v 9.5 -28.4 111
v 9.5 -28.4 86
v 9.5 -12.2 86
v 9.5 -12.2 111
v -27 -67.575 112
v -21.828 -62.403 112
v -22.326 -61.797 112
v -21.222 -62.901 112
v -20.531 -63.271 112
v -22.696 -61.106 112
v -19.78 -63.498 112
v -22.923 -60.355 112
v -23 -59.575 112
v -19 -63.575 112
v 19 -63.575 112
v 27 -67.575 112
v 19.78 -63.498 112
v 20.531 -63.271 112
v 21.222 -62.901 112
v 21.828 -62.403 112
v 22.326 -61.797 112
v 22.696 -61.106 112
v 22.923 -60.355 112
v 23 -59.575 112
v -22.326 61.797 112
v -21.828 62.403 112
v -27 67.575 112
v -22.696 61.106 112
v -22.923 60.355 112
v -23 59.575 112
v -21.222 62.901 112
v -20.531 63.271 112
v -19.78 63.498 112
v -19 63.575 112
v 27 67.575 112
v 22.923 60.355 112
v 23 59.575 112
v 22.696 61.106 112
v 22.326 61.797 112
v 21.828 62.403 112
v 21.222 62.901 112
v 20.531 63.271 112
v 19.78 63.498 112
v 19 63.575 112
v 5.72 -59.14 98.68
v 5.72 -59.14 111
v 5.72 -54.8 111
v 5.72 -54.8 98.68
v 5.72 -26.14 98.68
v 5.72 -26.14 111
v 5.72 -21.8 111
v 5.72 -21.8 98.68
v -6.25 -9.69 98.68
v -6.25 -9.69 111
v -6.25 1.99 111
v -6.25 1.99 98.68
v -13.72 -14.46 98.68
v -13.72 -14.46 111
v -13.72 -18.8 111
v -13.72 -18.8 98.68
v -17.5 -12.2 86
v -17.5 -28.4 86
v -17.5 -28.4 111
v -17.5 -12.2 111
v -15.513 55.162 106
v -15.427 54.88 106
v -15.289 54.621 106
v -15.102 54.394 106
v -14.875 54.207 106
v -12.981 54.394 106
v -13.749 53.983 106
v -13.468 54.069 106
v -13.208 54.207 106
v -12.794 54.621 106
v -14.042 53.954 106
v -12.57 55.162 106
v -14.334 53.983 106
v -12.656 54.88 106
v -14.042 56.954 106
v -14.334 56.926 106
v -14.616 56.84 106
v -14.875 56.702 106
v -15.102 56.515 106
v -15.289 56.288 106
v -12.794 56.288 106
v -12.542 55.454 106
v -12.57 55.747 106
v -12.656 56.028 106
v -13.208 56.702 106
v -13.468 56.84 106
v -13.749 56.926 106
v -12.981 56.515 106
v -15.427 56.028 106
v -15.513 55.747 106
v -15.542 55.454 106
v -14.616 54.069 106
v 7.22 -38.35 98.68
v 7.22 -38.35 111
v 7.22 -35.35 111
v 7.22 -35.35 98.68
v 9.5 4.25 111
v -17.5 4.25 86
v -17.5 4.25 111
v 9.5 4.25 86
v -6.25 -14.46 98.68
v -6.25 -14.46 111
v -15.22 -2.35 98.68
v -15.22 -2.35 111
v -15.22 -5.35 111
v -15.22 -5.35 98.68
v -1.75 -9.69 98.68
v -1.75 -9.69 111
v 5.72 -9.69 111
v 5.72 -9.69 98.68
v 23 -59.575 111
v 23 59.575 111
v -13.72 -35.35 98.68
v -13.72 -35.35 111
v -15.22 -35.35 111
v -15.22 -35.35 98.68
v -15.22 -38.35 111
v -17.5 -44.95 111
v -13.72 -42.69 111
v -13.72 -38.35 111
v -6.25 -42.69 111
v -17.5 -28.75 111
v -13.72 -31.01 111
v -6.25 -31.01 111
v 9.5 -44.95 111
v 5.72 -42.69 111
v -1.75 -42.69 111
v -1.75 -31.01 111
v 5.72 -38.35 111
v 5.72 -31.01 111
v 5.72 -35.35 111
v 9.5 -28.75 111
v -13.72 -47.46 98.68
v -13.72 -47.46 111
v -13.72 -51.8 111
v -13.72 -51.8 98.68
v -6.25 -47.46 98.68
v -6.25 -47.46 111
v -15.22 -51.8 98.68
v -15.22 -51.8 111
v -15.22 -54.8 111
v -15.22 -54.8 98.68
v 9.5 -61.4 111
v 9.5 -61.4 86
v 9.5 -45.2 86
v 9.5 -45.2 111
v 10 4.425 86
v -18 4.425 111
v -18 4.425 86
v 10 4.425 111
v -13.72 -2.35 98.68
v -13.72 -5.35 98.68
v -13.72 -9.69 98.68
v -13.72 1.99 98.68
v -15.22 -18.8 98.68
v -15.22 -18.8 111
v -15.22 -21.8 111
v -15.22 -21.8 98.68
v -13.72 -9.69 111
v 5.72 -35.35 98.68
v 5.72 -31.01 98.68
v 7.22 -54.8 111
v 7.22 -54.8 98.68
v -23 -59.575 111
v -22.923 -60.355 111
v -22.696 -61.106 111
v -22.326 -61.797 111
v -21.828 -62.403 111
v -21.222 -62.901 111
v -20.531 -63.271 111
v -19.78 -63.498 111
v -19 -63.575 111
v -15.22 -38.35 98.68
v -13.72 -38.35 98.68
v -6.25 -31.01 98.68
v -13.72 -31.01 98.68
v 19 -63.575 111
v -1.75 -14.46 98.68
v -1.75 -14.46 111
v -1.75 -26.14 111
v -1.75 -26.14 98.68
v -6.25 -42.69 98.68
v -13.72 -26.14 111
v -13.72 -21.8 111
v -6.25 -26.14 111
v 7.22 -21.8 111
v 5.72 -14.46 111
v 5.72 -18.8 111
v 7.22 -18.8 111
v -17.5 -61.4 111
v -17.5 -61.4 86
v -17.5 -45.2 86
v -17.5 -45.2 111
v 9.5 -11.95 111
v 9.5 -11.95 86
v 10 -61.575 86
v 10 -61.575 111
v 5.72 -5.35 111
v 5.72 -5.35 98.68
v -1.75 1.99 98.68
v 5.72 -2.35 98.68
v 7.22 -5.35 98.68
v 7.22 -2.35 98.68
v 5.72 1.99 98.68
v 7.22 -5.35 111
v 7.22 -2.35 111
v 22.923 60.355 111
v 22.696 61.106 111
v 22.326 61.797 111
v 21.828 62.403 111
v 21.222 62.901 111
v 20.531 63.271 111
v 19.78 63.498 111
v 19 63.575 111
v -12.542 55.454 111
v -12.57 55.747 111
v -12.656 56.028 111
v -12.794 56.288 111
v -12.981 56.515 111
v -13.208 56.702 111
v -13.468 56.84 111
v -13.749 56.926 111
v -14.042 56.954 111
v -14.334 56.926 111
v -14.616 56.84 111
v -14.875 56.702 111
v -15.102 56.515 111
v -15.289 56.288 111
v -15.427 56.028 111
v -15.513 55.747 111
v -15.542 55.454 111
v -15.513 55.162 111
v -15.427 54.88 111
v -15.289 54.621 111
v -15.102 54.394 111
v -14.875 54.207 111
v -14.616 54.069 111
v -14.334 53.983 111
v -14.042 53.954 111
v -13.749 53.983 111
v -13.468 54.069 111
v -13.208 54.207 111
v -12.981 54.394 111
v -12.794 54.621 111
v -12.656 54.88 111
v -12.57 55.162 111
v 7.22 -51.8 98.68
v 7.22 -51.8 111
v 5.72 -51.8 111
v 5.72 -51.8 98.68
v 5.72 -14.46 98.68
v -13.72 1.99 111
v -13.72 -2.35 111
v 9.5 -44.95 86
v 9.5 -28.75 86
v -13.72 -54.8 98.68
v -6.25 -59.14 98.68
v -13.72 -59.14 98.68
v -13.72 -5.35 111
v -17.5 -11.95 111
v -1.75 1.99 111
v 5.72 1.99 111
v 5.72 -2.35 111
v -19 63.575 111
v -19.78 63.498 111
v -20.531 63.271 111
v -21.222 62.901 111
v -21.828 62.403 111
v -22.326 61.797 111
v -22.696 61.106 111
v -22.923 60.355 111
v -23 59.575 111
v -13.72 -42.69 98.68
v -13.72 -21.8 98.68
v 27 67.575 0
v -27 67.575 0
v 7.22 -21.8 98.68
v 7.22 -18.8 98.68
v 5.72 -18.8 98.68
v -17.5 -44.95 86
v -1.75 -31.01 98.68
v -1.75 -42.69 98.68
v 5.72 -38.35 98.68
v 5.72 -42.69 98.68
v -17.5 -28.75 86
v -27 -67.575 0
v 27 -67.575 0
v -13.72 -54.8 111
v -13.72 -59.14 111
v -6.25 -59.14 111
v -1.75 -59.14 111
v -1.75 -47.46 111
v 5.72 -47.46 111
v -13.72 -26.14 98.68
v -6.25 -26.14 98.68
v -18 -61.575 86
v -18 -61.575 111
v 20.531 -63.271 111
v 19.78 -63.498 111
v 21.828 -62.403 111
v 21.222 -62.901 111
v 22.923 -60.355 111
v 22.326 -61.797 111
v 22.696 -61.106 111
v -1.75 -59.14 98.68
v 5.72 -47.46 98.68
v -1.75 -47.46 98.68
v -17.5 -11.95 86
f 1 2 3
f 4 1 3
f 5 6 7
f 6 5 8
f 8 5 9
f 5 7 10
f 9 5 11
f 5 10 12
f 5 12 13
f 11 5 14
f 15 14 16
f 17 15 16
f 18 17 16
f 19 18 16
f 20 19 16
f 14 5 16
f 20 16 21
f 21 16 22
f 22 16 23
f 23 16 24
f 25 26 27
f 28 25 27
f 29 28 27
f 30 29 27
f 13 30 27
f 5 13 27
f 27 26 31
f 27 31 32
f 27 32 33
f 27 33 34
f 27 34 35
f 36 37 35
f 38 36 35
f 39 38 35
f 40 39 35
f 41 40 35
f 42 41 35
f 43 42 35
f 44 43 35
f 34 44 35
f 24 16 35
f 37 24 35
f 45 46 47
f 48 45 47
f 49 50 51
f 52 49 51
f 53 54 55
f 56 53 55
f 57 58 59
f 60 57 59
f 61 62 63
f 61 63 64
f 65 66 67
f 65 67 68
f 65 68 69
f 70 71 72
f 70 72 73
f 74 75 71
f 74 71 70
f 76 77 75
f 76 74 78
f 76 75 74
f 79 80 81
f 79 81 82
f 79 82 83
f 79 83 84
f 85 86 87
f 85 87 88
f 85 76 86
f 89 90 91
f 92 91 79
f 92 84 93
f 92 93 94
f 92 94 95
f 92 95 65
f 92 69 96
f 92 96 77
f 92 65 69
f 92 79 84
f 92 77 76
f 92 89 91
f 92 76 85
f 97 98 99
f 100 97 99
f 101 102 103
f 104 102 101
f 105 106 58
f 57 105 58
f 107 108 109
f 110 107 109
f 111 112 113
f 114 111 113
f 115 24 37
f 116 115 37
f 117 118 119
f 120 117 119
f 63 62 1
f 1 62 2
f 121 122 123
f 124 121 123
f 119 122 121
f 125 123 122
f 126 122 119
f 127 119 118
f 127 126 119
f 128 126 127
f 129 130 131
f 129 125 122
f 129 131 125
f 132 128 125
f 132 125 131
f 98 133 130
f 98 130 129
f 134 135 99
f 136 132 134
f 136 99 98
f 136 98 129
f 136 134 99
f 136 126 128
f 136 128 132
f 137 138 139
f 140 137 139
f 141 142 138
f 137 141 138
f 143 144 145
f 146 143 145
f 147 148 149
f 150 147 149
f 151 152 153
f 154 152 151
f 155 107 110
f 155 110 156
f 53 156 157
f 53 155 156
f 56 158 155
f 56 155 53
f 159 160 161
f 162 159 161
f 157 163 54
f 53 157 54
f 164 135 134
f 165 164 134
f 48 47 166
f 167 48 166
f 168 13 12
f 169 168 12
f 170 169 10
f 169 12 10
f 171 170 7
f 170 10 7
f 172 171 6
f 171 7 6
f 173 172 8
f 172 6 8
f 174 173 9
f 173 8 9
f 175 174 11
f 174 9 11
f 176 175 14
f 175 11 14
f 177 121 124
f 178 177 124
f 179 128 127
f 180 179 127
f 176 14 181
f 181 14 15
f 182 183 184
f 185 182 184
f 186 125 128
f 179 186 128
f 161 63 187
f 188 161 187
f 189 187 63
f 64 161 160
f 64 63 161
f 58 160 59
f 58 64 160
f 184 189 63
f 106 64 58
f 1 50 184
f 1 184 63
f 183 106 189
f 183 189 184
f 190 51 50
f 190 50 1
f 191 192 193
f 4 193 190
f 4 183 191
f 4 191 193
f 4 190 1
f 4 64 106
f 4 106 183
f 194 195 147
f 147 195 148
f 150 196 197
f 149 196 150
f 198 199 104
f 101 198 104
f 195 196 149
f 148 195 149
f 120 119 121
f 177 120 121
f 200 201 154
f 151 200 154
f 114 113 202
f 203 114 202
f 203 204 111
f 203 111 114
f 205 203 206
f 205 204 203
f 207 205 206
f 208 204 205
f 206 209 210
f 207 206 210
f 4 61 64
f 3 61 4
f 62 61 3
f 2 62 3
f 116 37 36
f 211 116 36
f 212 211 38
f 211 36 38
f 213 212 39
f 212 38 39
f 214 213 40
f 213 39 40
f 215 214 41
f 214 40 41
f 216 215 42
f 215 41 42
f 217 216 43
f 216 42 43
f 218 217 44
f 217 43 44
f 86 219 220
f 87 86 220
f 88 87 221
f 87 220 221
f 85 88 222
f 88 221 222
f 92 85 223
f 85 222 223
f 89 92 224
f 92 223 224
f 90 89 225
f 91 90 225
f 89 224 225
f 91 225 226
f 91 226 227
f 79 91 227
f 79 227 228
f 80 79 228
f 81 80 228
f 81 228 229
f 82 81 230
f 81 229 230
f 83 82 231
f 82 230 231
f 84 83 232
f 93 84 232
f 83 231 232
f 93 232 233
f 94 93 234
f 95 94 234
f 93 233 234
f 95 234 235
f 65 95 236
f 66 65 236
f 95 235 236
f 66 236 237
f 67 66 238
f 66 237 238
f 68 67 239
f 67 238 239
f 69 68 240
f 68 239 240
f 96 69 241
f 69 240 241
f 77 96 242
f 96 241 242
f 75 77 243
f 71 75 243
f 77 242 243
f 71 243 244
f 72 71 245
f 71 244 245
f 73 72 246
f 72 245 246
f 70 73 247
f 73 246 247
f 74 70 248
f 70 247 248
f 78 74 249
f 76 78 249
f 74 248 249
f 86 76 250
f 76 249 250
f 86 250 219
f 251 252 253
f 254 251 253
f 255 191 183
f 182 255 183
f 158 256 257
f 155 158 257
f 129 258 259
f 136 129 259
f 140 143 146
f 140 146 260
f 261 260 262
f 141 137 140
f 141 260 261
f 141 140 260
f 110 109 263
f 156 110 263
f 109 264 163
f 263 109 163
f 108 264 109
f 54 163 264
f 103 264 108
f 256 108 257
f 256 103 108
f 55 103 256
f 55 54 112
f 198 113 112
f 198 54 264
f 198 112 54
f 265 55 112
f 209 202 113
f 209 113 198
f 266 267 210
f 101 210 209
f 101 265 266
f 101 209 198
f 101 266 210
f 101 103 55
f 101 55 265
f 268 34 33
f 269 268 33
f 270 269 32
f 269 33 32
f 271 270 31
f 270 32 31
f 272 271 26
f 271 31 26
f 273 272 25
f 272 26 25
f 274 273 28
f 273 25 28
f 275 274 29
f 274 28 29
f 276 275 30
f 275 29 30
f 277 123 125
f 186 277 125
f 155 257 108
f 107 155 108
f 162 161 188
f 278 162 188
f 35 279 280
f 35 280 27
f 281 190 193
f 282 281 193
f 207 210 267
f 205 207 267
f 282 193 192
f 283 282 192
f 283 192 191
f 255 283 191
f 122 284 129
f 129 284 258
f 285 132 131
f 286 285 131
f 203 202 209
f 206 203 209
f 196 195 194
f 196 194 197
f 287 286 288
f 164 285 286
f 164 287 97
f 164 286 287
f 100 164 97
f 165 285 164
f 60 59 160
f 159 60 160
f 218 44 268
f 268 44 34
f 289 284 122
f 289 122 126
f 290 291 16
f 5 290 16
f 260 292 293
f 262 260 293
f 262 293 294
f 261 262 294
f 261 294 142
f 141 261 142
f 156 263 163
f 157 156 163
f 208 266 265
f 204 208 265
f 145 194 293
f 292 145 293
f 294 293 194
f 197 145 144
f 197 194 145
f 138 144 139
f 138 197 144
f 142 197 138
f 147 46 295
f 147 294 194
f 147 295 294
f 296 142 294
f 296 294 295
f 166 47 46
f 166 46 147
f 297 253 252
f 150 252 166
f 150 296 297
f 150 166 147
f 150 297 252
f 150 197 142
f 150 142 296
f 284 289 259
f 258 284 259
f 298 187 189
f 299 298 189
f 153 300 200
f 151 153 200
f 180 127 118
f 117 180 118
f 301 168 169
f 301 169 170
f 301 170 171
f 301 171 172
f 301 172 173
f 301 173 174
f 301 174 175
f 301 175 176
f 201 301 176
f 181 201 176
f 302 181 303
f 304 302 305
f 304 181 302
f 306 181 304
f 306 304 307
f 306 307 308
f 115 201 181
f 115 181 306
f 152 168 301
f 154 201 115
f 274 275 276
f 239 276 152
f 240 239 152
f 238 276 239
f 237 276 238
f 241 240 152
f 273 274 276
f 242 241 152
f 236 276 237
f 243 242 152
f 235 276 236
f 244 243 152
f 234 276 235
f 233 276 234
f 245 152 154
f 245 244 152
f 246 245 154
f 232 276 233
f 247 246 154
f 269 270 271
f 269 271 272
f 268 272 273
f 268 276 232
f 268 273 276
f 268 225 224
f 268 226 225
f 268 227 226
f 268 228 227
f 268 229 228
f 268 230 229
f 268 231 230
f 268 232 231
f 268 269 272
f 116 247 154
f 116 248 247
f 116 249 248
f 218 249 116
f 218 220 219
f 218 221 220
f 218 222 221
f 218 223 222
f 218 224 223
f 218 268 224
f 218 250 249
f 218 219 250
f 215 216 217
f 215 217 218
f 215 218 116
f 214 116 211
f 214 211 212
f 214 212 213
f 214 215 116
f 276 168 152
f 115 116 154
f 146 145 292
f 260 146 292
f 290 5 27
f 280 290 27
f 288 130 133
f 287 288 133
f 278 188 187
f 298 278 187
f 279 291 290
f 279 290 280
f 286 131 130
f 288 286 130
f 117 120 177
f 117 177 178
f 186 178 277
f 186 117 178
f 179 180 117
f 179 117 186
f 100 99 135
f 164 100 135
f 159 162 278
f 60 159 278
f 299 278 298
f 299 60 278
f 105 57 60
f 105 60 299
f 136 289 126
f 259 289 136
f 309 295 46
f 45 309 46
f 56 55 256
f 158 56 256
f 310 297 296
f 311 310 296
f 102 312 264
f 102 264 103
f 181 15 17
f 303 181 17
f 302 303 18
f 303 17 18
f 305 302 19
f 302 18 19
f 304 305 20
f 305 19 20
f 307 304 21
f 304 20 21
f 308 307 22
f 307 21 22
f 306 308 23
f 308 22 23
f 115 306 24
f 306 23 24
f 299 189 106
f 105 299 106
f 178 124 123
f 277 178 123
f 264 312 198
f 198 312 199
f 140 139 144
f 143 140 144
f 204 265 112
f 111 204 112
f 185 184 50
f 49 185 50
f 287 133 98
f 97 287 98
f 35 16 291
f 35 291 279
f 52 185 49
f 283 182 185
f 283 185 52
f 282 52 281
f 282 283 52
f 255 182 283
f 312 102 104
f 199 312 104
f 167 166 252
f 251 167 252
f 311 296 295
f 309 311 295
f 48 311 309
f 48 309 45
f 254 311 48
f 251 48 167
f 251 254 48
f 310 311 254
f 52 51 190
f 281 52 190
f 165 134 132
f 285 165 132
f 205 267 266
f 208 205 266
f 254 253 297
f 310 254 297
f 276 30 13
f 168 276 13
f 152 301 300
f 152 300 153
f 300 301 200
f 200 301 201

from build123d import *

# Parameters (mm, degrees)
F0_W      = 135.15
F0_H      = 112
F1_DEPTH  = 27
F3_DEPTH  = 1
F4_W      = 28
F4_H      = 66
F5_DEPTH  = 25
F6_W      = 27
F6_H      = 16.2
F7_DEPTH  = 25
F9_DEPTH  = 12.32
F10_R     = 1.5
F11_DEPTH = 5


with BuildPart() as f1:
    # F0 (on Right) → F1 (new body, symmetric)
    with BuildSketch(Plane.YZ):
        with Locations((0, 56)):
            Rectangle(F0_W, F0_H)
    extrude(amount=F1_DEPTH, both=True)

    # F2 (on face) → F3 (cut)
    with BuildSketch(Plane.XY.offset(112)):
        with BuildLine():
            ThreePointArc((23, 59.575), (21.828427, 62.403427), (19, 63.575))
            Line((19, 63.575), (-19, 63.575))
            ThreePointArc((-19, 63.575), (-21.828427, 62.403427), (-23, 59.575))
            Line((-23, 59.575), (-23, -59.575))
            ThreePointArc((-23, -59.575), (-21.828427, -62.403427), (-19, -63.575))
            Line((-19, -63.575), (19, -63.575))
            ThreePointArc((19, -63.575), (21.828427, -62.403427), (23, -59.575))
            Line((23, -59.575), (23, 59.575))
        make_face()
    extrude(amount=-F3_DEPTH, mode=Mode.SUBTRACT)

    # F4 (on face) → F5 (cut)
    with BuildSketch(Plane.XY.offset(111)):
        with Locations((-4, -28.575)):
            Rectangle(F4_W, F4_H)
    extrude(amount=-F5_DEPTH, mode=Mode.SUBTRACT)

    # F10 (on face) → F11 (cut)
    with BuildSketch(Plane.XY.offset(111)):
        with Locations((-14.041667, 55.454373)):
            Circle(F10_R)
    extrude(amount=-F11_DEPTH, mode=Mode.SUBTRACT)


with BuildPart() as f7:
    # F6 (on face) → F7 (new body)
    with BuildSketch(Plane.XY.offset(86)):
        with Locations((-4, -20.300343)):
            Rectangle(F6_W, F6_H)
        with Locations((-4, -3.849657)):
            Rectangle(F6_W, F6_H)
        with Locations((-4, -36.849657)):
            Rectangle(F6_W, F6_H)
        with Locations((-4, -53.300343)):
            Rectangle(F6_W, F6_H)
    extrude(amount=F7_DEPTH)

    # F8 (on face) → F9 (cut)
    with BuildSketch(Plane.XY.offset(111)):
        Polygon((-13.72, -9.689657), (-6.25, -9.689657), (-6.25, 1.990343), (-13.72, 1.990343), (-13.72, -2.349657), (-15.22, -2.349657), (-15.22, -5.349657), (-13.72, -5.349657), align=None)
        Polygon((7.22, -2.349657), (5.72, -2.349657), (5.72, 1.990343), (-1.75, 1.990343), (-1.75, -9.689657), (5.72, -9.689657), (5.72, -5.349657), (7.22, -5.349657), align=None)
        Polygon((5.72, -18.800343), (5.72, -14.460343), (-1.75, -14.460343), (-1.75, -26.140343), (5.72, -26.140343), (5.72, -21.800343), (7.22, -21.800343), (7.22, -18.800343), align=None)
        Polygon((-6.25, -26.140343), (-6.25, -14.460343), (-13.72, -14.460343), (-13.72, -18.800343), (-15.22, -18.800343), (-15.22, -21.800343), (-13.72, -21.800343), (-13.72, -26.140343), align=None)
        Polygon((5.72, -31.009657), (-1.75, -31.009657), (-1.75, -42.689657), (5.72, -42.689657), (5.72, -38.349657), (7.22, -38.349657), (7.22, -35.349657), (5.72, -35.349657), align=None)
        Polygon((-13.72, -42.689657), (-6.25, -42.689657), (-6.25, -31.009657), (-13.72, -31.009657), (-13.72, -35.349657), (-15.22, -35.349657), (-15.22, -38.349657), (-13.72, -38.349657), align=None)
        Polygon((5.72, -51.800343), (5.72, -47.460343), (-1.75, -47.460343), (-1.75, -59.140343), (5.72, -59.140343), (5.72, -54.800343), (7.22, -54.800343), (7.22, -51.800343), align=None)
        Polygon((-6.25, -59.140343), (-6.25, -47.460343), (-13.72, -47.460343), (-13.72, -51.800343), (-15.22, -51.800343), (-15.22, -54.800343), (-13.72, -54.800343), (-13.72, -59.140343), align=None)
    extrude(amount=-F9_DEPTH, mode=Mode.SUBTRACT)


solid = Compound([f1.part, f7.part])
